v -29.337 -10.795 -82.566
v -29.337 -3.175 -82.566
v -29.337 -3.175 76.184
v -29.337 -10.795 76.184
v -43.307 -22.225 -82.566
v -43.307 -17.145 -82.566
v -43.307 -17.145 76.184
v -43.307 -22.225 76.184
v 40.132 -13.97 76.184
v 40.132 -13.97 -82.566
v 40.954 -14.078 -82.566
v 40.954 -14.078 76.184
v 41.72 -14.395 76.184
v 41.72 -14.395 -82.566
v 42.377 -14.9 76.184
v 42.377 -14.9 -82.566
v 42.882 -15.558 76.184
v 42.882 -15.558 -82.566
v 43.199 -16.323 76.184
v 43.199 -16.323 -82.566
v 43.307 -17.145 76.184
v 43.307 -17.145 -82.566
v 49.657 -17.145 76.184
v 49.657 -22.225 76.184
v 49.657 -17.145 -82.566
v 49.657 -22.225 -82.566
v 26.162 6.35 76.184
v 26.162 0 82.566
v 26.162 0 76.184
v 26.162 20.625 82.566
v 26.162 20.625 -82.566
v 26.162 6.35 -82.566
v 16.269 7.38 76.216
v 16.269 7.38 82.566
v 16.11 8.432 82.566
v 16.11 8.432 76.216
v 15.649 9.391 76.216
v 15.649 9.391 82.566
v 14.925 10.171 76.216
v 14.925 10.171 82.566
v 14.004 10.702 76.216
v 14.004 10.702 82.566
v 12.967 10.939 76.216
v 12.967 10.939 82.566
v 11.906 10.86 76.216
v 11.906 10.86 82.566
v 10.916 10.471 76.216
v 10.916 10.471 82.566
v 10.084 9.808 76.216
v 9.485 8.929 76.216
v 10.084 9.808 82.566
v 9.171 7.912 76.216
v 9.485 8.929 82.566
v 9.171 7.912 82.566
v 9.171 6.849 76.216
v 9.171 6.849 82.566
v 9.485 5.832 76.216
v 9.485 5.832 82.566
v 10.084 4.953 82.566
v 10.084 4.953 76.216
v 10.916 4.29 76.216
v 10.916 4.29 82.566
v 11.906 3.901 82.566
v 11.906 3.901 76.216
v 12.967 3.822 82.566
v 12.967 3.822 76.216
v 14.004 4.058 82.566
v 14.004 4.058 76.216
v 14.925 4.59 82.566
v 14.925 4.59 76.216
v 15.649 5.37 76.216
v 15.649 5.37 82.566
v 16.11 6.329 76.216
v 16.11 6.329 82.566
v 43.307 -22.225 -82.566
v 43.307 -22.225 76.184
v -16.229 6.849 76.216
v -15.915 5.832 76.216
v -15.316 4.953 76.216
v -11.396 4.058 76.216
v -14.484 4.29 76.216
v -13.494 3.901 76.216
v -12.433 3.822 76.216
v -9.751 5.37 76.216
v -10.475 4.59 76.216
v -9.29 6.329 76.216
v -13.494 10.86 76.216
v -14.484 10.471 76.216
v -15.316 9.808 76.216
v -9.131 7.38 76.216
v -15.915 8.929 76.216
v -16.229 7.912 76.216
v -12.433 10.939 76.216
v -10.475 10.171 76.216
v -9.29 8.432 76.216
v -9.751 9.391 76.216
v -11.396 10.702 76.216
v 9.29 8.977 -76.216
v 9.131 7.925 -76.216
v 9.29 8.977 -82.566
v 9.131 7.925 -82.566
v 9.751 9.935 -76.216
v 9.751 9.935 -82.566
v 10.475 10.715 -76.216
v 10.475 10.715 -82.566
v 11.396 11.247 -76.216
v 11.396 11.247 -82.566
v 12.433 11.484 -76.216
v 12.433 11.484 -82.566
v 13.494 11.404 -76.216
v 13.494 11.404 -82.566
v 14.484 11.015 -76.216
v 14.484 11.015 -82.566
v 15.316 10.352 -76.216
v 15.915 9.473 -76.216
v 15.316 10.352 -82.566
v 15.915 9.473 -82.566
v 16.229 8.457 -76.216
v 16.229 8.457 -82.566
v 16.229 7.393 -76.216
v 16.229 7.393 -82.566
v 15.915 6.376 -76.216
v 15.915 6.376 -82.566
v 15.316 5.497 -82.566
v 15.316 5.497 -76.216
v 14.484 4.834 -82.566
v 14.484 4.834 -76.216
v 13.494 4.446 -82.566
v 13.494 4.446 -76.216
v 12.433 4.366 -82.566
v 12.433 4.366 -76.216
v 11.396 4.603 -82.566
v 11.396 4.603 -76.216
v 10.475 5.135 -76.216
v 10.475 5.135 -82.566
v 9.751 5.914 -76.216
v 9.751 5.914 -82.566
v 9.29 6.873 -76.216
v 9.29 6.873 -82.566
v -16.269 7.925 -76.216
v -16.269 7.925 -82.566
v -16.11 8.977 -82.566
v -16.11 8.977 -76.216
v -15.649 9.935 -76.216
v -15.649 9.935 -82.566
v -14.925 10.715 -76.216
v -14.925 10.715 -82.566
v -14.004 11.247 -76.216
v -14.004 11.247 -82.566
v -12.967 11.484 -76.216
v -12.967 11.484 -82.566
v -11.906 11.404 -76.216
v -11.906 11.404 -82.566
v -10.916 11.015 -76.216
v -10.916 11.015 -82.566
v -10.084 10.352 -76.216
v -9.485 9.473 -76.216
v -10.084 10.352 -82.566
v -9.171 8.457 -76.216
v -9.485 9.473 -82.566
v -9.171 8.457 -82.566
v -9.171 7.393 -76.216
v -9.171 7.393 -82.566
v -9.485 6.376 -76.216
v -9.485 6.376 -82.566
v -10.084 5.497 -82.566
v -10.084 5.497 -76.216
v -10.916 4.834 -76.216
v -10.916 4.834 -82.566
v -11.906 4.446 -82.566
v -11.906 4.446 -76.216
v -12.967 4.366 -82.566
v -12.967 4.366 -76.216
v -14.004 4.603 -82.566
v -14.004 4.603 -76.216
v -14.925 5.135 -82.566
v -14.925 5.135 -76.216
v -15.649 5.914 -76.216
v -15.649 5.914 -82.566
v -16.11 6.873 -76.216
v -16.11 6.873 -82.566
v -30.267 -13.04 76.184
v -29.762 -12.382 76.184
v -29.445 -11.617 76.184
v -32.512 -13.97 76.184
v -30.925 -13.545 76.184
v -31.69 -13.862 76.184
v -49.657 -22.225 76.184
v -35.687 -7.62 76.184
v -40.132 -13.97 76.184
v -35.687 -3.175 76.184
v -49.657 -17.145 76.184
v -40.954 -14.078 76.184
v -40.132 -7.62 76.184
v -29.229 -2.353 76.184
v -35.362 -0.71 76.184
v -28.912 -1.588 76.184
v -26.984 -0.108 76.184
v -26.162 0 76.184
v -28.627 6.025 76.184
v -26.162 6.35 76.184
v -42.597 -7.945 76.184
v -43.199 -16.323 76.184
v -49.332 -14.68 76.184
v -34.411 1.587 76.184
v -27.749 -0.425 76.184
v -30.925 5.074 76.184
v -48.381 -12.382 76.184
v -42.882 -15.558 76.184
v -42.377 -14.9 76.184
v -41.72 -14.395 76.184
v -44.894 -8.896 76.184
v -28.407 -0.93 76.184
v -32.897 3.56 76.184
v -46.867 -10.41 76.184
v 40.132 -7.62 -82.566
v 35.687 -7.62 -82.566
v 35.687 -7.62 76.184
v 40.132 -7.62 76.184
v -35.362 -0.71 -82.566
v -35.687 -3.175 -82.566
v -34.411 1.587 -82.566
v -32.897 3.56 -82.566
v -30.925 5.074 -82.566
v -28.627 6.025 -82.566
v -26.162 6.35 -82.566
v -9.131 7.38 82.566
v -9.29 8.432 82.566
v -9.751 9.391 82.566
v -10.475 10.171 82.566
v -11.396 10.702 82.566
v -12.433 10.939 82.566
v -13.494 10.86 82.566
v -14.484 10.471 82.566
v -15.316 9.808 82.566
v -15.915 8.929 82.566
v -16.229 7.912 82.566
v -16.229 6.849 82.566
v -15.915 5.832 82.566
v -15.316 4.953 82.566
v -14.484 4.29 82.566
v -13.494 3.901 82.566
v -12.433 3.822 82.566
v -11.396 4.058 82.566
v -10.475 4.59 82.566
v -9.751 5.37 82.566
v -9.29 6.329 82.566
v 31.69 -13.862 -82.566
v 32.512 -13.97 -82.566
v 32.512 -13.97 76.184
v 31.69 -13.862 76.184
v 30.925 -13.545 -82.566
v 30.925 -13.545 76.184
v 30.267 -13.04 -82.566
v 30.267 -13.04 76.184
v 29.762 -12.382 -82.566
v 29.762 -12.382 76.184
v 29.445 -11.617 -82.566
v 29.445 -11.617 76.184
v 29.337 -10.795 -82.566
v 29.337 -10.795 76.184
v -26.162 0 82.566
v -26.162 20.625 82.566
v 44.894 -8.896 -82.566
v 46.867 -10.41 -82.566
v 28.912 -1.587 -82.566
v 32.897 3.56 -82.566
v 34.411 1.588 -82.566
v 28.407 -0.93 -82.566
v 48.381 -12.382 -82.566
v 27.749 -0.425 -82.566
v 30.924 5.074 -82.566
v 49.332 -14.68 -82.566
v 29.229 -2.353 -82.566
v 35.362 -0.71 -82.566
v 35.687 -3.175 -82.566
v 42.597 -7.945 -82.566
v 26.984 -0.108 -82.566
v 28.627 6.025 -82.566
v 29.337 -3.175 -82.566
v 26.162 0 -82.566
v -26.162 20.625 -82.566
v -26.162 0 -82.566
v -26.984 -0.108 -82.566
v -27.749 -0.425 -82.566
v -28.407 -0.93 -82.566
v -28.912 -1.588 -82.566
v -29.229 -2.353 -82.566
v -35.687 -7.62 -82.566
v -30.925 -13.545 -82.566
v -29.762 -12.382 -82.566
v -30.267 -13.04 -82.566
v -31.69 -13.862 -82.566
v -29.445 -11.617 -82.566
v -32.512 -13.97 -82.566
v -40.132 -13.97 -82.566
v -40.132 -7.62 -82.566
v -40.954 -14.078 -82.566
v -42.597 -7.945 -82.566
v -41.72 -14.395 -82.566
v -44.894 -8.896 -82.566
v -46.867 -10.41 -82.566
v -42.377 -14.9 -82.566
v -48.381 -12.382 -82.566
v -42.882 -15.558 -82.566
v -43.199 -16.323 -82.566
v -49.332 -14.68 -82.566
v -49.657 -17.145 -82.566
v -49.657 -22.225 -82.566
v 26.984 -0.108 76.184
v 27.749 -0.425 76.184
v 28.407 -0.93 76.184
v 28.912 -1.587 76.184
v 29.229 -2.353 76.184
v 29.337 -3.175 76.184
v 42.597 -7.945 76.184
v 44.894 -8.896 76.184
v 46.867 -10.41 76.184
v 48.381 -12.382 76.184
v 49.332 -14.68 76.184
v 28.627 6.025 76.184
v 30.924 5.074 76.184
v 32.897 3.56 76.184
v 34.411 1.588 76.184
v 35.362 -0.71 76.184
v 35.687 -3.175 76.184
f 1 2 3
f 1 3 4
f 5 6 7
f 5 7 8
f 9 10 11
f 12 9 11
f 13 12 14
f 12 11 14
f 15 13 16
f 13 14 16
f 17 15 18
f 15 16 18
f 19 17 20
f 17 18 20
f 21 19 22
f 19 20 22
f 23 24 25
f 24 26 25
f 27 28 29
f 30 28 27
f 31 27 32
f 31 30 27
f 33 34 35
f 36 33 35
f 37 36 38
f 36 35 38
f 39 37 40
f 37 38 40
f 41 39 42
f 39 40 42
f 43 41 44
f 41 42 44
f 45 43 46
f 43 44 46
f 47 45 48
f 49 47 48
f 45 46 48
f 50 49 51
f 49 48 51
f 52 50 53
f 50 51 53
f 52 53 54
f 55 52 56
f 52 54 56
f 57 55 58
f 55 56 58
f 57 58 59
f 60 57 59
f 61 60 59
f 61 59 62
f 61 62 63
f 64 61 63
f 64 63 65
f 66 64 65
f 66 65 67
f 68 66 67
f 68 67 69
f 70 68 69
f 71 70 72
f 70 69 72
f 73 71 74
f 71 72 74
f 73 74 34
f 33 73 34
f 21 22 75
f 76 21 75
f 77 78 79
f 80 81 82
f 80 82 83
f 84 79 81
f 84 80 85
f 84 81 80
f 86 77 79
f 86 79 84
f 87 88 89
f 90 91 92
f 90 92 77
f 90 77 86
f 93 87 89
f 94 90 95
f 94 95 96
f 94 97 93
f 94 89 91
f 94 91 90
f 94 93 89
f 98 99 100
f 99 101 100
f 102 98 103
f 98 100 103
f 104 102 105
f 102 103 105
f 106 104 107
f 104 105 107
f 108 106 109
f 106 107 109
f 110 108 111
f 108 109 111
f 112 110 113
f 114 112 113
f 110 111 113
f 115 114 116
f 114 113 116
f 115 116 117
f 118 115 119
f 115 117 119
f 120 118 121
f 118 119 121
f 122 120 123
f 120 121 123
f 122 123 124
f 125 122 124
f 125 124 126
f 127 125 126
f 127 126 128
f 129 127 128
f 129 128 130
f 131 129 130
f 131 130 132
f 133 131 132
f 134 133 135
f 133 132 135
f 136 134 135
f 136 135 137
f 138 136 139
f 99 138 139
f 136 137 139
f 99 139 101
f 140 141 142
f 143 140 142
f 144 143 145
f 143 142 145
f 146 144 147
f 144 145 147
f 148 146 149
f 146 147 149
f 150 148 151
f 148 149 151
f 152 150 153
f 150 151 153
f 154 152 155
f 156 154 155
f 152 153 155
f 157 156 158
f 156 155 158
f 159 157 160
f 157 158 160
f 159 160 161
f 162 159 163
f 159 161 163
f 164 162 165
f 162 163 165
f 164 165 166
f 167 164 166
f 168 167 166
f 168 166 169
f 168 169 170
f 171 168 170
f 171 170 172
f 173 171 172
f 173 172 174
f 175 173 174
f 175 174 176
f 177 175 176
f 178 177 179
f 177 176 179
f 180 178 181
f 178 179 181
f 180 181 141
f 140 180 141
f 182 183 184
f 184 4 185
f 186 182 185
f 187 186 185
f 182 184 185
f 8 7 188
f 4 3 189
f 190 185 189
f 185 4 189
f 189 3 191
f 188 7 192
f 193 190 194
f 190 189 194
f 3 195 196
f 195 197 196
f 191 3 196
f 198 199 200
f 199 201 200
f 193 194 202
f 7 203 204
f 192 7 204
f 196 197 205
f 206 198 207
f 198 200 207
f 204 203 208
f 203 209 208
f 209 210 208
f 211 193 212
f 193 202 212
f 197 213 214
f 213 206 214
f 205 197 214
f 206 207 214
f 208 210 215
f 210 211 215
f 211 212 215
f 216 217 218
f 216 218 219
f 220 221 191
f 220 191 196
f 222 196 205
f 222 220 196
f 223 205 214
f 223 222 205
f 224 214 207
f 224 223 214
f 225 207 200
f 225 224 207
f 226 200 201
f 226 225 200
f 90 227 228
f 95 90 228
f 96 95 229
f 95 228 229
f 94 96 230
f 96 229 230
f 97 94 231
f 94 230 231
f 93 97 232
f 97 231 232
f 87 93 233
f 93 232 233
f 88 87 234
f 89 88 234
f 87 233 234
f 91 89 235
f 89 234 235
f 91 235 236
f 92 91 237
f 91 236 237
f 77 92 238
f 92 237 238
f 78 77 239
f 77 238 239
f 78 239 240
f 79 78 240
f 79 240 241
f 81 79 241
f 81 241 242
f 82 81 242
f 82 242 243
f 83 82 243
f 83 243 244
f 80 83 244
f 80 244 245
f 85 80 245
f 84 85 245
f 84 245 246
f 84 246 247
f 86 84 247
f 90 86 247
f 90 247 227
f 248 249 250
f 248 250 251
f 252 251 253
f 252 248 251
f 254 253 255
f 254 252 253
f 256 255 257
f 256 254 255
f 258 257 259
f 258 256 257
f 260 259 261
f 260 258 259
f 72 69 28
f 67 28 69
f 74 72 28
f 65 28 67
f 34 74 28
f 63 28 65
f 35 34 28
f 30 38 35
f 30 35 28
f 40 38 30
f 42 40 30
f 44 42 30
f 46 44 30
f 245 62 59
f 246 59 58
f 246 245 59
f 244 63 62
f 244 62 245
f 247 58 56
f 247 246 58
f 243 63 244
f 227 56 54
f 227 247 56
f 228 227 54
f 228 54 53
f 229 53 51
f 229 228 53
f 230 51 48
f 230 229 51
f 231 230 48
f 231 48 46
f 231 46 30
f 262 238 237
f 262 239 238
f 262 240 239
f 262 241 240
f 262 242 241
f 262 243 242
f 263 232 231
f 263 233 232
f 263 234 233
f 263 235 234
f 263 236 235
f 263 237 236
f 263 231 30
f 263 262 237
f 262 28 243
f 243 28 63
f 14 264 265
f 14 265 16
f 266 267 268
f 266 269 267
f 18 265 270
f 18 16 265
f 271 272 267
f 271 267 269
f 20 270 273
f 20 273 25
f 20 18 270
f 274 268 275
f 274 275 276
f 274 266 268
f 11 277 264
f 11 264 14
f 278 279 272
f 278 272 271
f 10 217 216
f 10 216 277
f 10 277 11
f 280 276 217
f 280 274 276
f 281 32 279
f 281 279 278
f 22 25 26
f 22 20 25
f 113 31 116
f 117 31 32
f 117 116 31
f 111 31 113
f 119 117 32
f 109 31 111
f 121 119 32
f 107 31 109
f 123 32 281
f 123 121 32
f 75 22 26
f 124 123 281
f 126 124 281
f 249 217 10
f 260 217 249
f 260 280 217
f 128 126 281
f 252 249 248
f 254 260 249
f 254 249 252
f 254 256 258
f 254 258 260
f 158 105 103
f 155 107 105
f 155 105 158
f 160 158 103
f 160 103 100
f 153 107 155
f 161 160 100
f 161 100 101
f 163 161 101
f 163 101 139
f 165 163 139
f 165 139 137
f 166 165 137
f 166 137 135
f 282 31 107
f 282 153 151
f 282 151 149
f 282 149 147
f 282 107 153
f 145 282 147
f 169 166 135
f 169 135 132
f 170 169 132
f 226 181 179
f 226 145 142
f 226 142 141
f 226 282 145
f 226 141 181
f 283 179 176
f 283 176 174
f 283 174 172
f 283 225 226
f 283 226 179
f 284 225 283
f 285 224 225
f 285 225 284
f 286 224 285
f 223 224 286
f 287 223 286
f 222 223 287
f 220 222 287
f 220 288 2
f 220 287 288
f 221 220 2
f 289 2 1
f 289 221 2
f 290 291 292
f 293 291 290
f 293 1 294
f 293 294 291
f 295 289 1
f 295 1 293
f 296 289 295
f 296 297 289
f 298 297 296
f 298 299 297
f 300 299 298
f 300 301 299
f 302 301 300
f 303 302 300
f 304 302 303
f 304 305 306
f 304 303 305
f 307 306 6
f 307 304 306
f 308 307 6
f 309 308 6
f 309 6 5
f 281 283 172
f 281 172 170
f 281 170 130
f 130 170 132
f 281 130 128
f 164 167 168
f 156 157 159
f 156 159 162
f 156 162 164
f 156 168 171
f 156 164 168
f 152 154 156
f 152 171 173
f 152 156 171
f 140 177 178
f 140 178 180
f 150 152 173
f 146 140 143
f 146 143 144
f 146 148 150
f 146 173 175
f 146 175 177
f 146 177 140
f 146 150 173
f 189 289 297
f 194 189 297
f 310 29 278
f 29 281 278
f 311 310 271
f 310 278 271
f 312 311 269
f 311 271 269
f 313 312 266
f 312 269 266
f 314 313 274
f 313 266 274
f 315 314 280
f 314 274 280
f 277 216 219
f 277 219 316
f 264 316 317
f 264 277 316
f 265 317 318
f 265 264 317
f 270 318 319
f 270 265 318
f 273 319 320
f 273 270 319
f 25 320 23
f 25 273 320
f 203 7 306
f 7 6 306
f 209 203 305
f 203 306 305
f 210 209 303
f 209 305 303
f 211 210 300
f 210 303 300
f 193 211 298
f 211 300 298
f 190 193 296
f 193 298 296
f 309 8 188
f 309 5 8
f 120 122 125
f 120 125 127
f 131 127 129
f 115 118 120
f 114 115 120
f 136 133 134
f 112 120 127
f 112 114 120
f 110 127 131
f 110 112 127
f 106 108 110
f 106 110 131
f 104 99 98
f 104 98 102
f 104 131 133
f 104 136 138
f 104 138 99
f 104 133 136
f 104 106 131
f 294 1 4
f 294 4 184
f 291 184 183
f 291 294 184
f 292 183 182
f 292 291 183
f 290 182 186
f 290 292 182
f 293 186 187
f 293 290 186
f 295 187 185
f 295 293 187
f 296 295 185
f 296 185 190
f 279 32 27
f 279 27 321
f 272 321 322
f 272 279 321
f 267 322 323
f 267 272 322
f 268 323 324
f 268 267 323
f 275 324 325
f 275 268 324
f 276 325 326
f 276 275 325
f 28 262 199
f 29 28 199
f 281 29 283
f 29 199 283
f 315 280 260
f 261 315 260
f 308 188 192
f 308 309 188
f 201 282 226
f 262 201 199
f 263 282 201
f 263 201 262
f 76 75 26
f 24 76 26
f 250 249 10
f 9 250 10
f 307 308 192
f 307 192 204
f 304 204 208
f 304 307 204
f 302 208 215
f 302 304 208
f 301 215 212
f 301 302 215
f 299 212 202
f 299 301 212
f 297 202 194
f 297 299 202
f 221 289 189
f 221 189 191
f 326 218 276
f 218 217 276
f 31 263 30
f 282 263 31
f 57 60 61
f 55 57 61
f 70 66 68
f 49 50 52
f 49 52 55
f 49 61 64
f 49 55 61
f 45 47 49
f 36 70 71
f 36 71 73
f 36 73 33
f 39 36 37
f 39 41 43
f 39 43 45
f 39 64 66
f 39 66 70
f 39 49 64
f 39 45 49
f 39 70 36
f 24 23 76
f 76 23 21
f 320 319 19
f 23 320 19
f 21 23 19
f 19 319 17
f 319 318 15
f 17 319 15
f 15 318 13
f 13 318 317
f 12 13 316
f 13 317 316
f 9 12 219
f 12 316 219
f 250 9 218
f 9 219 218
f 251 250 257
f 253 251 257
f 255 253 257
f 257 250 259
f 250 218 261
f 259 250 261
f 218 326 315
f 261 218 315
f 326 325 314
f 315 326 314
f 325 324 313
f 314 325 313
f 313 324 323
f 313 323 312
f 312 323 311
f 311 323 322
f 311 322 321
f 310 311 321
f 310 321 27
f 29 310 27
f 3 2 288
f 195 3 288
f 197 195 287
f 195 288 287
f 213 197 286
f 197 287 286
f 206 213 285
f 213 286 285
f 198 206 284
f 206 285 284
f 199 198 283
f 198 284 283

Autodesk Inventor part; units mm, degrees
ref_plane "YZ Plane" through (0, 0, 0) normal (1, 0, 0) x (0, 1, 0)
ref_plane "XZ Plane" through (0, 0, 0) normal (0, 1, 0) x (-1, 0, 0)
ref_plane "XY Plane" through (0, 0, 0) normal (0, 0, 1) x (1, 0, 0)
sketch "Sketch1" plane through (0, 0, 0) normal (0, 1, 0) x (-1, 0, 0)
  line L0 (-23.8125, -82.566) -> (23.8125, -82.566)
  line L1 (23.8125, -82.566) -> (23.8125, 82.566)
  line L2 (23.8125, 82.566) -> (-23.8125, 82.566)
  line L3 (-23.8125, 82.566) -> (-23.8125, -82.566)
  line L4 (-23.8125, -82.566) -> (23.8125, 82.566) construction
  line L5 (23.8125, -82.566) -> (-23.8125, 82.566) construction
  point P0 (0, 0)
  dimension "d0" = 47.625
  dimension "d1" = 165.132
extrude "Extrusion1" add sketch "Sketch1" along normal blind 20.6248
sketch "Sketch5" plane through (-23.8125, 0, -82.566) normal (-1, 0, 0) x (0, 0, 1)
  line L0 (0, 20.6248) -> (165.132, 20.6248) projected
  line L1 (165.132, 0) -> (0, 0) projected
  line L2 (0, 20.6248) -> (165.132, 20.6248)
  line L3 (165.132, 20.6248) -> (165.132, 0)
  line L4 (165.132, 0) -> (0, 0)
  line L5 (0, 0) -> (0, 20.6248)
  point P0 (82.566, 0)
extrude "Extrusion4" add sketch "Sketch5" along normal blind 2.3495
sketch "Sketch6" plane through (23.8125, 0, 82.566) normal (1, 0, 0) x (0, 0, -1)
  line L0 (0, 0) -> (0, 20.6248) projected
  line L1 (0, 0) -> (165.132, 0) projected
  line L2 (0, 20.6248) -> (165.132, 20.6248)
  line L3 (165.132, 20.6248) -> (165.132, 0)
  line L4 (165.132, 0) -> (0, 0)
  line L5 (0, 0) -> (0, 20.6248)
  point P0 (82.566, 0)
extrude "Extrusion5" add sketch "Sketch6" along normal blind 2.3495
sketch "Sketch7" plane through (-26.162, 0, -82.566) normal (0, 0, -1) x (-1, 0, 0)
  line L0 (0, 0) -> (-52.324, 0) projected
  line L1 (0, -3.175) -> (3.175, -3.175)
  line L2 (0, -3.175) -> (0, 0)
  arc A0 (3.175, -3.175) -> (0, 0) centre (0, -3.175) ccw
  line L3 (-52.324, 0) -> (-52.324, -3.175)
  arc A1 (-52.324, 0) -> (-55.499, -3.175) centre (-52.324, -3.175) ccw
  line L4 (-52.324, -3.175) -> (-55.499, -3.175)
  line L5 (-52.324, 0) -> (-52.324, 6.35)
  line L6 (-52.324, 0) -> (-52.324, 20.6248) projected
  arc A2 (-52.324, 6.35) -> (-61.849, -3.175) centre (-52.324, -3.175) ccw
  line L7 (-55.499, -3.175) -> (-61.849, -3.175)
  line L8 (-55.499, -3.175) -> (-55.499, -10.795)
  line L9 (-55.499, -10.795) -> (-61.849, -10.795)
  line L10 (-61.849, -10.795) -> (-61.849, -3.175)
  line L11 (-55.499, -10.795) -> (-58.674, -10.795)
  arc A3 (-58.674, -13.97) -> (-55.499, -10.795) centre (-58.674, -10.795) ccw
  line L12 (-58.674, -13.97) -> (-66.294, -13.97)
  line L13 (-66.294, -13.97) -> (-66.294, -17.145)
  arc A4 (-66.294, -13.97) -> (-69.469, -17.145) centre (-66.294, -17.145) ccw
  line L14 (-66.294, -17.145) -> (-69.469, -17.145)
  line L15 (-69.469, -17.145) -> (-69.469, -22.225)
  line L16 (-61.849, -13.97) -> (-61.849, -7.62)
  line L17 (-61.849, -7.62) -> (-66.294, -7.62)
  arc A5 (-66.294, -7.62) -> (-75.819, -17.145) centre (-66.294, -17.145) ccw
  line L18 (-69.469, -22.225) -> (-75.819, -22.225)
  line L19 (-75.819, -22.225) -> (-75.819, -17.145)
  line L20 (-69.469, -17.145) -> (-75.819, -17.145)
  line L21 (-26.162, 0) -> (-26.162, 12.6356)
  arc A6 (3.175, -3.175) -> (0, 0) centre (0, -3.175) ccw
  line L22 (0, -3.175) -> (3.175, -3.175)
  arc A7 (9.525, -3.175) -> (0, 6.35) centre (0, -3.175) ccw
  line L23 (3.175, -3.175) -> (9.525, -3.175)
  line L24 (3.175, -3.175) -> (3.175, -10.795)
  line L25 (3.175, -10.795) -> (9.525, -10.795)
  line L26 (9.525, -10.795) -> (9.525, -3.175)
  line L27 (3.175, -10.795) -> (6.35, -10.795)
  arc A8 (3.175, -10.795) -> (6.35, -13.97) centre (6.35, -10.795) ccw
  line L28 (6.35, -13.97) -> (13.97, -13.97)
  line L29 (13.97, -13.97) -> (13.97, -17.145)
  arc A9 (17.145, -17.145) -> (13.97, -13.97) centre (13.97, -17.145) ccw
  line L30 (13.97, -17.145) -> (17.145, -17.145)
  line L31 (17.145, -17.145) -> (17.145, -22.225)
  line L32 (9.525, -13.97) -> (9.525, -7.62)
  line L33 (9.525, -7.62) -> (13.97, -7.62)
  arc A10 (23.495, -17.145) -> (13.97, -7.62) centre (13.97, -17.145) ccw
  line L34 (17.145, -22.225) -> (23.495, -22.225)
  line L35 (23.495, -22.225) -> (23.495, -17.145)
  line L36 (17.145, -17.145) -> (23.495, -17.145)
  line L37 (0, 20.6248) -> (0, 0) projected
  line L38 (0, 0) -> (0, 6.35)
  dimension "d22" = 3.175
  dimension "d23" = 6.35
  dimension "d24" = 7.62
  dimension "d26" = 7.62
  dimension "d29" = 3.175
  dimension "d30" = 5.08
  dimension "d31" = 6.35
  dimension "d32" = 6.35
extrude "Extrusion6" add sketch "Sketch7" against normal blind 158.75 contours A1 L7 A2 L5 | L37 A7 L23 A0 | L23 L26 L25 L24 | L25 L32 L28 A8 | L8 L9 L10 L7 | L33 A10 L36 A9 L28 L32 L26 | A3 L12 L16 L9 | L10 L16 L12 A4 L20 A5 L17 | L35 L34 L31 L36 | L20 L15 L18 L19
sketch "Sketch10" plane through (-26.162, 0, 82.566) normal (0, 0, 1) x (1, 0, 0)
  line L0 (26.162, 20.0804) -> (26.162, 7.3804)
  line L1 (26.162, 7.3804) -> (38.862, 7.3804)
  line L2 (26.162, 7.3804) -> (13.462, 7.3804)
  circle A0 centre (13.462, 7.3804) radius 3.5687
  circle A1 centre (38.862, 7.3804) radius 3.5687
  point P0 (26.162, 0)
  dimension "d52" = 12.7
  dimension "d53" = 12.7
  dimension "d54" = 12.7
  dimension "d55" = 7.1374
  dimension "d56" = 7.1374
extrude "Extrusion9" cut sketch "Sketch10" against normal blind 6.35
sketch "Sketch11" plane through (26.162, 20.6248, -82.566) normal (0, 0, -1) x (-1, 0, 0)
  line L0 (0, 0) -> (52.324, 0) projected
  line L1 (26.162, 0) -> (26.162, -12.7)
  line L2 (26.162, -12.7) -> (38.862, -12.7)
  line L3 (38.862, -12.7) -> (13.462, -12.7)
  circle A0 centre (38.862, -12.7) radius 3.5687
  circle A1 centre (13.462, -12.7) radius 3.5687
  point P0 (26.162, -20.6248)
  dimension "d59" = 12.7
  dimension "d60" = 12.7
  dimension "d61" = 25.4
  dimension "d62" = 7.1374
  dimension "d63" = 7.1374
extrude "Extrusion10" cut sketch "Sketch11" against normal blind 6.35
properties part number "Clamp connector"
